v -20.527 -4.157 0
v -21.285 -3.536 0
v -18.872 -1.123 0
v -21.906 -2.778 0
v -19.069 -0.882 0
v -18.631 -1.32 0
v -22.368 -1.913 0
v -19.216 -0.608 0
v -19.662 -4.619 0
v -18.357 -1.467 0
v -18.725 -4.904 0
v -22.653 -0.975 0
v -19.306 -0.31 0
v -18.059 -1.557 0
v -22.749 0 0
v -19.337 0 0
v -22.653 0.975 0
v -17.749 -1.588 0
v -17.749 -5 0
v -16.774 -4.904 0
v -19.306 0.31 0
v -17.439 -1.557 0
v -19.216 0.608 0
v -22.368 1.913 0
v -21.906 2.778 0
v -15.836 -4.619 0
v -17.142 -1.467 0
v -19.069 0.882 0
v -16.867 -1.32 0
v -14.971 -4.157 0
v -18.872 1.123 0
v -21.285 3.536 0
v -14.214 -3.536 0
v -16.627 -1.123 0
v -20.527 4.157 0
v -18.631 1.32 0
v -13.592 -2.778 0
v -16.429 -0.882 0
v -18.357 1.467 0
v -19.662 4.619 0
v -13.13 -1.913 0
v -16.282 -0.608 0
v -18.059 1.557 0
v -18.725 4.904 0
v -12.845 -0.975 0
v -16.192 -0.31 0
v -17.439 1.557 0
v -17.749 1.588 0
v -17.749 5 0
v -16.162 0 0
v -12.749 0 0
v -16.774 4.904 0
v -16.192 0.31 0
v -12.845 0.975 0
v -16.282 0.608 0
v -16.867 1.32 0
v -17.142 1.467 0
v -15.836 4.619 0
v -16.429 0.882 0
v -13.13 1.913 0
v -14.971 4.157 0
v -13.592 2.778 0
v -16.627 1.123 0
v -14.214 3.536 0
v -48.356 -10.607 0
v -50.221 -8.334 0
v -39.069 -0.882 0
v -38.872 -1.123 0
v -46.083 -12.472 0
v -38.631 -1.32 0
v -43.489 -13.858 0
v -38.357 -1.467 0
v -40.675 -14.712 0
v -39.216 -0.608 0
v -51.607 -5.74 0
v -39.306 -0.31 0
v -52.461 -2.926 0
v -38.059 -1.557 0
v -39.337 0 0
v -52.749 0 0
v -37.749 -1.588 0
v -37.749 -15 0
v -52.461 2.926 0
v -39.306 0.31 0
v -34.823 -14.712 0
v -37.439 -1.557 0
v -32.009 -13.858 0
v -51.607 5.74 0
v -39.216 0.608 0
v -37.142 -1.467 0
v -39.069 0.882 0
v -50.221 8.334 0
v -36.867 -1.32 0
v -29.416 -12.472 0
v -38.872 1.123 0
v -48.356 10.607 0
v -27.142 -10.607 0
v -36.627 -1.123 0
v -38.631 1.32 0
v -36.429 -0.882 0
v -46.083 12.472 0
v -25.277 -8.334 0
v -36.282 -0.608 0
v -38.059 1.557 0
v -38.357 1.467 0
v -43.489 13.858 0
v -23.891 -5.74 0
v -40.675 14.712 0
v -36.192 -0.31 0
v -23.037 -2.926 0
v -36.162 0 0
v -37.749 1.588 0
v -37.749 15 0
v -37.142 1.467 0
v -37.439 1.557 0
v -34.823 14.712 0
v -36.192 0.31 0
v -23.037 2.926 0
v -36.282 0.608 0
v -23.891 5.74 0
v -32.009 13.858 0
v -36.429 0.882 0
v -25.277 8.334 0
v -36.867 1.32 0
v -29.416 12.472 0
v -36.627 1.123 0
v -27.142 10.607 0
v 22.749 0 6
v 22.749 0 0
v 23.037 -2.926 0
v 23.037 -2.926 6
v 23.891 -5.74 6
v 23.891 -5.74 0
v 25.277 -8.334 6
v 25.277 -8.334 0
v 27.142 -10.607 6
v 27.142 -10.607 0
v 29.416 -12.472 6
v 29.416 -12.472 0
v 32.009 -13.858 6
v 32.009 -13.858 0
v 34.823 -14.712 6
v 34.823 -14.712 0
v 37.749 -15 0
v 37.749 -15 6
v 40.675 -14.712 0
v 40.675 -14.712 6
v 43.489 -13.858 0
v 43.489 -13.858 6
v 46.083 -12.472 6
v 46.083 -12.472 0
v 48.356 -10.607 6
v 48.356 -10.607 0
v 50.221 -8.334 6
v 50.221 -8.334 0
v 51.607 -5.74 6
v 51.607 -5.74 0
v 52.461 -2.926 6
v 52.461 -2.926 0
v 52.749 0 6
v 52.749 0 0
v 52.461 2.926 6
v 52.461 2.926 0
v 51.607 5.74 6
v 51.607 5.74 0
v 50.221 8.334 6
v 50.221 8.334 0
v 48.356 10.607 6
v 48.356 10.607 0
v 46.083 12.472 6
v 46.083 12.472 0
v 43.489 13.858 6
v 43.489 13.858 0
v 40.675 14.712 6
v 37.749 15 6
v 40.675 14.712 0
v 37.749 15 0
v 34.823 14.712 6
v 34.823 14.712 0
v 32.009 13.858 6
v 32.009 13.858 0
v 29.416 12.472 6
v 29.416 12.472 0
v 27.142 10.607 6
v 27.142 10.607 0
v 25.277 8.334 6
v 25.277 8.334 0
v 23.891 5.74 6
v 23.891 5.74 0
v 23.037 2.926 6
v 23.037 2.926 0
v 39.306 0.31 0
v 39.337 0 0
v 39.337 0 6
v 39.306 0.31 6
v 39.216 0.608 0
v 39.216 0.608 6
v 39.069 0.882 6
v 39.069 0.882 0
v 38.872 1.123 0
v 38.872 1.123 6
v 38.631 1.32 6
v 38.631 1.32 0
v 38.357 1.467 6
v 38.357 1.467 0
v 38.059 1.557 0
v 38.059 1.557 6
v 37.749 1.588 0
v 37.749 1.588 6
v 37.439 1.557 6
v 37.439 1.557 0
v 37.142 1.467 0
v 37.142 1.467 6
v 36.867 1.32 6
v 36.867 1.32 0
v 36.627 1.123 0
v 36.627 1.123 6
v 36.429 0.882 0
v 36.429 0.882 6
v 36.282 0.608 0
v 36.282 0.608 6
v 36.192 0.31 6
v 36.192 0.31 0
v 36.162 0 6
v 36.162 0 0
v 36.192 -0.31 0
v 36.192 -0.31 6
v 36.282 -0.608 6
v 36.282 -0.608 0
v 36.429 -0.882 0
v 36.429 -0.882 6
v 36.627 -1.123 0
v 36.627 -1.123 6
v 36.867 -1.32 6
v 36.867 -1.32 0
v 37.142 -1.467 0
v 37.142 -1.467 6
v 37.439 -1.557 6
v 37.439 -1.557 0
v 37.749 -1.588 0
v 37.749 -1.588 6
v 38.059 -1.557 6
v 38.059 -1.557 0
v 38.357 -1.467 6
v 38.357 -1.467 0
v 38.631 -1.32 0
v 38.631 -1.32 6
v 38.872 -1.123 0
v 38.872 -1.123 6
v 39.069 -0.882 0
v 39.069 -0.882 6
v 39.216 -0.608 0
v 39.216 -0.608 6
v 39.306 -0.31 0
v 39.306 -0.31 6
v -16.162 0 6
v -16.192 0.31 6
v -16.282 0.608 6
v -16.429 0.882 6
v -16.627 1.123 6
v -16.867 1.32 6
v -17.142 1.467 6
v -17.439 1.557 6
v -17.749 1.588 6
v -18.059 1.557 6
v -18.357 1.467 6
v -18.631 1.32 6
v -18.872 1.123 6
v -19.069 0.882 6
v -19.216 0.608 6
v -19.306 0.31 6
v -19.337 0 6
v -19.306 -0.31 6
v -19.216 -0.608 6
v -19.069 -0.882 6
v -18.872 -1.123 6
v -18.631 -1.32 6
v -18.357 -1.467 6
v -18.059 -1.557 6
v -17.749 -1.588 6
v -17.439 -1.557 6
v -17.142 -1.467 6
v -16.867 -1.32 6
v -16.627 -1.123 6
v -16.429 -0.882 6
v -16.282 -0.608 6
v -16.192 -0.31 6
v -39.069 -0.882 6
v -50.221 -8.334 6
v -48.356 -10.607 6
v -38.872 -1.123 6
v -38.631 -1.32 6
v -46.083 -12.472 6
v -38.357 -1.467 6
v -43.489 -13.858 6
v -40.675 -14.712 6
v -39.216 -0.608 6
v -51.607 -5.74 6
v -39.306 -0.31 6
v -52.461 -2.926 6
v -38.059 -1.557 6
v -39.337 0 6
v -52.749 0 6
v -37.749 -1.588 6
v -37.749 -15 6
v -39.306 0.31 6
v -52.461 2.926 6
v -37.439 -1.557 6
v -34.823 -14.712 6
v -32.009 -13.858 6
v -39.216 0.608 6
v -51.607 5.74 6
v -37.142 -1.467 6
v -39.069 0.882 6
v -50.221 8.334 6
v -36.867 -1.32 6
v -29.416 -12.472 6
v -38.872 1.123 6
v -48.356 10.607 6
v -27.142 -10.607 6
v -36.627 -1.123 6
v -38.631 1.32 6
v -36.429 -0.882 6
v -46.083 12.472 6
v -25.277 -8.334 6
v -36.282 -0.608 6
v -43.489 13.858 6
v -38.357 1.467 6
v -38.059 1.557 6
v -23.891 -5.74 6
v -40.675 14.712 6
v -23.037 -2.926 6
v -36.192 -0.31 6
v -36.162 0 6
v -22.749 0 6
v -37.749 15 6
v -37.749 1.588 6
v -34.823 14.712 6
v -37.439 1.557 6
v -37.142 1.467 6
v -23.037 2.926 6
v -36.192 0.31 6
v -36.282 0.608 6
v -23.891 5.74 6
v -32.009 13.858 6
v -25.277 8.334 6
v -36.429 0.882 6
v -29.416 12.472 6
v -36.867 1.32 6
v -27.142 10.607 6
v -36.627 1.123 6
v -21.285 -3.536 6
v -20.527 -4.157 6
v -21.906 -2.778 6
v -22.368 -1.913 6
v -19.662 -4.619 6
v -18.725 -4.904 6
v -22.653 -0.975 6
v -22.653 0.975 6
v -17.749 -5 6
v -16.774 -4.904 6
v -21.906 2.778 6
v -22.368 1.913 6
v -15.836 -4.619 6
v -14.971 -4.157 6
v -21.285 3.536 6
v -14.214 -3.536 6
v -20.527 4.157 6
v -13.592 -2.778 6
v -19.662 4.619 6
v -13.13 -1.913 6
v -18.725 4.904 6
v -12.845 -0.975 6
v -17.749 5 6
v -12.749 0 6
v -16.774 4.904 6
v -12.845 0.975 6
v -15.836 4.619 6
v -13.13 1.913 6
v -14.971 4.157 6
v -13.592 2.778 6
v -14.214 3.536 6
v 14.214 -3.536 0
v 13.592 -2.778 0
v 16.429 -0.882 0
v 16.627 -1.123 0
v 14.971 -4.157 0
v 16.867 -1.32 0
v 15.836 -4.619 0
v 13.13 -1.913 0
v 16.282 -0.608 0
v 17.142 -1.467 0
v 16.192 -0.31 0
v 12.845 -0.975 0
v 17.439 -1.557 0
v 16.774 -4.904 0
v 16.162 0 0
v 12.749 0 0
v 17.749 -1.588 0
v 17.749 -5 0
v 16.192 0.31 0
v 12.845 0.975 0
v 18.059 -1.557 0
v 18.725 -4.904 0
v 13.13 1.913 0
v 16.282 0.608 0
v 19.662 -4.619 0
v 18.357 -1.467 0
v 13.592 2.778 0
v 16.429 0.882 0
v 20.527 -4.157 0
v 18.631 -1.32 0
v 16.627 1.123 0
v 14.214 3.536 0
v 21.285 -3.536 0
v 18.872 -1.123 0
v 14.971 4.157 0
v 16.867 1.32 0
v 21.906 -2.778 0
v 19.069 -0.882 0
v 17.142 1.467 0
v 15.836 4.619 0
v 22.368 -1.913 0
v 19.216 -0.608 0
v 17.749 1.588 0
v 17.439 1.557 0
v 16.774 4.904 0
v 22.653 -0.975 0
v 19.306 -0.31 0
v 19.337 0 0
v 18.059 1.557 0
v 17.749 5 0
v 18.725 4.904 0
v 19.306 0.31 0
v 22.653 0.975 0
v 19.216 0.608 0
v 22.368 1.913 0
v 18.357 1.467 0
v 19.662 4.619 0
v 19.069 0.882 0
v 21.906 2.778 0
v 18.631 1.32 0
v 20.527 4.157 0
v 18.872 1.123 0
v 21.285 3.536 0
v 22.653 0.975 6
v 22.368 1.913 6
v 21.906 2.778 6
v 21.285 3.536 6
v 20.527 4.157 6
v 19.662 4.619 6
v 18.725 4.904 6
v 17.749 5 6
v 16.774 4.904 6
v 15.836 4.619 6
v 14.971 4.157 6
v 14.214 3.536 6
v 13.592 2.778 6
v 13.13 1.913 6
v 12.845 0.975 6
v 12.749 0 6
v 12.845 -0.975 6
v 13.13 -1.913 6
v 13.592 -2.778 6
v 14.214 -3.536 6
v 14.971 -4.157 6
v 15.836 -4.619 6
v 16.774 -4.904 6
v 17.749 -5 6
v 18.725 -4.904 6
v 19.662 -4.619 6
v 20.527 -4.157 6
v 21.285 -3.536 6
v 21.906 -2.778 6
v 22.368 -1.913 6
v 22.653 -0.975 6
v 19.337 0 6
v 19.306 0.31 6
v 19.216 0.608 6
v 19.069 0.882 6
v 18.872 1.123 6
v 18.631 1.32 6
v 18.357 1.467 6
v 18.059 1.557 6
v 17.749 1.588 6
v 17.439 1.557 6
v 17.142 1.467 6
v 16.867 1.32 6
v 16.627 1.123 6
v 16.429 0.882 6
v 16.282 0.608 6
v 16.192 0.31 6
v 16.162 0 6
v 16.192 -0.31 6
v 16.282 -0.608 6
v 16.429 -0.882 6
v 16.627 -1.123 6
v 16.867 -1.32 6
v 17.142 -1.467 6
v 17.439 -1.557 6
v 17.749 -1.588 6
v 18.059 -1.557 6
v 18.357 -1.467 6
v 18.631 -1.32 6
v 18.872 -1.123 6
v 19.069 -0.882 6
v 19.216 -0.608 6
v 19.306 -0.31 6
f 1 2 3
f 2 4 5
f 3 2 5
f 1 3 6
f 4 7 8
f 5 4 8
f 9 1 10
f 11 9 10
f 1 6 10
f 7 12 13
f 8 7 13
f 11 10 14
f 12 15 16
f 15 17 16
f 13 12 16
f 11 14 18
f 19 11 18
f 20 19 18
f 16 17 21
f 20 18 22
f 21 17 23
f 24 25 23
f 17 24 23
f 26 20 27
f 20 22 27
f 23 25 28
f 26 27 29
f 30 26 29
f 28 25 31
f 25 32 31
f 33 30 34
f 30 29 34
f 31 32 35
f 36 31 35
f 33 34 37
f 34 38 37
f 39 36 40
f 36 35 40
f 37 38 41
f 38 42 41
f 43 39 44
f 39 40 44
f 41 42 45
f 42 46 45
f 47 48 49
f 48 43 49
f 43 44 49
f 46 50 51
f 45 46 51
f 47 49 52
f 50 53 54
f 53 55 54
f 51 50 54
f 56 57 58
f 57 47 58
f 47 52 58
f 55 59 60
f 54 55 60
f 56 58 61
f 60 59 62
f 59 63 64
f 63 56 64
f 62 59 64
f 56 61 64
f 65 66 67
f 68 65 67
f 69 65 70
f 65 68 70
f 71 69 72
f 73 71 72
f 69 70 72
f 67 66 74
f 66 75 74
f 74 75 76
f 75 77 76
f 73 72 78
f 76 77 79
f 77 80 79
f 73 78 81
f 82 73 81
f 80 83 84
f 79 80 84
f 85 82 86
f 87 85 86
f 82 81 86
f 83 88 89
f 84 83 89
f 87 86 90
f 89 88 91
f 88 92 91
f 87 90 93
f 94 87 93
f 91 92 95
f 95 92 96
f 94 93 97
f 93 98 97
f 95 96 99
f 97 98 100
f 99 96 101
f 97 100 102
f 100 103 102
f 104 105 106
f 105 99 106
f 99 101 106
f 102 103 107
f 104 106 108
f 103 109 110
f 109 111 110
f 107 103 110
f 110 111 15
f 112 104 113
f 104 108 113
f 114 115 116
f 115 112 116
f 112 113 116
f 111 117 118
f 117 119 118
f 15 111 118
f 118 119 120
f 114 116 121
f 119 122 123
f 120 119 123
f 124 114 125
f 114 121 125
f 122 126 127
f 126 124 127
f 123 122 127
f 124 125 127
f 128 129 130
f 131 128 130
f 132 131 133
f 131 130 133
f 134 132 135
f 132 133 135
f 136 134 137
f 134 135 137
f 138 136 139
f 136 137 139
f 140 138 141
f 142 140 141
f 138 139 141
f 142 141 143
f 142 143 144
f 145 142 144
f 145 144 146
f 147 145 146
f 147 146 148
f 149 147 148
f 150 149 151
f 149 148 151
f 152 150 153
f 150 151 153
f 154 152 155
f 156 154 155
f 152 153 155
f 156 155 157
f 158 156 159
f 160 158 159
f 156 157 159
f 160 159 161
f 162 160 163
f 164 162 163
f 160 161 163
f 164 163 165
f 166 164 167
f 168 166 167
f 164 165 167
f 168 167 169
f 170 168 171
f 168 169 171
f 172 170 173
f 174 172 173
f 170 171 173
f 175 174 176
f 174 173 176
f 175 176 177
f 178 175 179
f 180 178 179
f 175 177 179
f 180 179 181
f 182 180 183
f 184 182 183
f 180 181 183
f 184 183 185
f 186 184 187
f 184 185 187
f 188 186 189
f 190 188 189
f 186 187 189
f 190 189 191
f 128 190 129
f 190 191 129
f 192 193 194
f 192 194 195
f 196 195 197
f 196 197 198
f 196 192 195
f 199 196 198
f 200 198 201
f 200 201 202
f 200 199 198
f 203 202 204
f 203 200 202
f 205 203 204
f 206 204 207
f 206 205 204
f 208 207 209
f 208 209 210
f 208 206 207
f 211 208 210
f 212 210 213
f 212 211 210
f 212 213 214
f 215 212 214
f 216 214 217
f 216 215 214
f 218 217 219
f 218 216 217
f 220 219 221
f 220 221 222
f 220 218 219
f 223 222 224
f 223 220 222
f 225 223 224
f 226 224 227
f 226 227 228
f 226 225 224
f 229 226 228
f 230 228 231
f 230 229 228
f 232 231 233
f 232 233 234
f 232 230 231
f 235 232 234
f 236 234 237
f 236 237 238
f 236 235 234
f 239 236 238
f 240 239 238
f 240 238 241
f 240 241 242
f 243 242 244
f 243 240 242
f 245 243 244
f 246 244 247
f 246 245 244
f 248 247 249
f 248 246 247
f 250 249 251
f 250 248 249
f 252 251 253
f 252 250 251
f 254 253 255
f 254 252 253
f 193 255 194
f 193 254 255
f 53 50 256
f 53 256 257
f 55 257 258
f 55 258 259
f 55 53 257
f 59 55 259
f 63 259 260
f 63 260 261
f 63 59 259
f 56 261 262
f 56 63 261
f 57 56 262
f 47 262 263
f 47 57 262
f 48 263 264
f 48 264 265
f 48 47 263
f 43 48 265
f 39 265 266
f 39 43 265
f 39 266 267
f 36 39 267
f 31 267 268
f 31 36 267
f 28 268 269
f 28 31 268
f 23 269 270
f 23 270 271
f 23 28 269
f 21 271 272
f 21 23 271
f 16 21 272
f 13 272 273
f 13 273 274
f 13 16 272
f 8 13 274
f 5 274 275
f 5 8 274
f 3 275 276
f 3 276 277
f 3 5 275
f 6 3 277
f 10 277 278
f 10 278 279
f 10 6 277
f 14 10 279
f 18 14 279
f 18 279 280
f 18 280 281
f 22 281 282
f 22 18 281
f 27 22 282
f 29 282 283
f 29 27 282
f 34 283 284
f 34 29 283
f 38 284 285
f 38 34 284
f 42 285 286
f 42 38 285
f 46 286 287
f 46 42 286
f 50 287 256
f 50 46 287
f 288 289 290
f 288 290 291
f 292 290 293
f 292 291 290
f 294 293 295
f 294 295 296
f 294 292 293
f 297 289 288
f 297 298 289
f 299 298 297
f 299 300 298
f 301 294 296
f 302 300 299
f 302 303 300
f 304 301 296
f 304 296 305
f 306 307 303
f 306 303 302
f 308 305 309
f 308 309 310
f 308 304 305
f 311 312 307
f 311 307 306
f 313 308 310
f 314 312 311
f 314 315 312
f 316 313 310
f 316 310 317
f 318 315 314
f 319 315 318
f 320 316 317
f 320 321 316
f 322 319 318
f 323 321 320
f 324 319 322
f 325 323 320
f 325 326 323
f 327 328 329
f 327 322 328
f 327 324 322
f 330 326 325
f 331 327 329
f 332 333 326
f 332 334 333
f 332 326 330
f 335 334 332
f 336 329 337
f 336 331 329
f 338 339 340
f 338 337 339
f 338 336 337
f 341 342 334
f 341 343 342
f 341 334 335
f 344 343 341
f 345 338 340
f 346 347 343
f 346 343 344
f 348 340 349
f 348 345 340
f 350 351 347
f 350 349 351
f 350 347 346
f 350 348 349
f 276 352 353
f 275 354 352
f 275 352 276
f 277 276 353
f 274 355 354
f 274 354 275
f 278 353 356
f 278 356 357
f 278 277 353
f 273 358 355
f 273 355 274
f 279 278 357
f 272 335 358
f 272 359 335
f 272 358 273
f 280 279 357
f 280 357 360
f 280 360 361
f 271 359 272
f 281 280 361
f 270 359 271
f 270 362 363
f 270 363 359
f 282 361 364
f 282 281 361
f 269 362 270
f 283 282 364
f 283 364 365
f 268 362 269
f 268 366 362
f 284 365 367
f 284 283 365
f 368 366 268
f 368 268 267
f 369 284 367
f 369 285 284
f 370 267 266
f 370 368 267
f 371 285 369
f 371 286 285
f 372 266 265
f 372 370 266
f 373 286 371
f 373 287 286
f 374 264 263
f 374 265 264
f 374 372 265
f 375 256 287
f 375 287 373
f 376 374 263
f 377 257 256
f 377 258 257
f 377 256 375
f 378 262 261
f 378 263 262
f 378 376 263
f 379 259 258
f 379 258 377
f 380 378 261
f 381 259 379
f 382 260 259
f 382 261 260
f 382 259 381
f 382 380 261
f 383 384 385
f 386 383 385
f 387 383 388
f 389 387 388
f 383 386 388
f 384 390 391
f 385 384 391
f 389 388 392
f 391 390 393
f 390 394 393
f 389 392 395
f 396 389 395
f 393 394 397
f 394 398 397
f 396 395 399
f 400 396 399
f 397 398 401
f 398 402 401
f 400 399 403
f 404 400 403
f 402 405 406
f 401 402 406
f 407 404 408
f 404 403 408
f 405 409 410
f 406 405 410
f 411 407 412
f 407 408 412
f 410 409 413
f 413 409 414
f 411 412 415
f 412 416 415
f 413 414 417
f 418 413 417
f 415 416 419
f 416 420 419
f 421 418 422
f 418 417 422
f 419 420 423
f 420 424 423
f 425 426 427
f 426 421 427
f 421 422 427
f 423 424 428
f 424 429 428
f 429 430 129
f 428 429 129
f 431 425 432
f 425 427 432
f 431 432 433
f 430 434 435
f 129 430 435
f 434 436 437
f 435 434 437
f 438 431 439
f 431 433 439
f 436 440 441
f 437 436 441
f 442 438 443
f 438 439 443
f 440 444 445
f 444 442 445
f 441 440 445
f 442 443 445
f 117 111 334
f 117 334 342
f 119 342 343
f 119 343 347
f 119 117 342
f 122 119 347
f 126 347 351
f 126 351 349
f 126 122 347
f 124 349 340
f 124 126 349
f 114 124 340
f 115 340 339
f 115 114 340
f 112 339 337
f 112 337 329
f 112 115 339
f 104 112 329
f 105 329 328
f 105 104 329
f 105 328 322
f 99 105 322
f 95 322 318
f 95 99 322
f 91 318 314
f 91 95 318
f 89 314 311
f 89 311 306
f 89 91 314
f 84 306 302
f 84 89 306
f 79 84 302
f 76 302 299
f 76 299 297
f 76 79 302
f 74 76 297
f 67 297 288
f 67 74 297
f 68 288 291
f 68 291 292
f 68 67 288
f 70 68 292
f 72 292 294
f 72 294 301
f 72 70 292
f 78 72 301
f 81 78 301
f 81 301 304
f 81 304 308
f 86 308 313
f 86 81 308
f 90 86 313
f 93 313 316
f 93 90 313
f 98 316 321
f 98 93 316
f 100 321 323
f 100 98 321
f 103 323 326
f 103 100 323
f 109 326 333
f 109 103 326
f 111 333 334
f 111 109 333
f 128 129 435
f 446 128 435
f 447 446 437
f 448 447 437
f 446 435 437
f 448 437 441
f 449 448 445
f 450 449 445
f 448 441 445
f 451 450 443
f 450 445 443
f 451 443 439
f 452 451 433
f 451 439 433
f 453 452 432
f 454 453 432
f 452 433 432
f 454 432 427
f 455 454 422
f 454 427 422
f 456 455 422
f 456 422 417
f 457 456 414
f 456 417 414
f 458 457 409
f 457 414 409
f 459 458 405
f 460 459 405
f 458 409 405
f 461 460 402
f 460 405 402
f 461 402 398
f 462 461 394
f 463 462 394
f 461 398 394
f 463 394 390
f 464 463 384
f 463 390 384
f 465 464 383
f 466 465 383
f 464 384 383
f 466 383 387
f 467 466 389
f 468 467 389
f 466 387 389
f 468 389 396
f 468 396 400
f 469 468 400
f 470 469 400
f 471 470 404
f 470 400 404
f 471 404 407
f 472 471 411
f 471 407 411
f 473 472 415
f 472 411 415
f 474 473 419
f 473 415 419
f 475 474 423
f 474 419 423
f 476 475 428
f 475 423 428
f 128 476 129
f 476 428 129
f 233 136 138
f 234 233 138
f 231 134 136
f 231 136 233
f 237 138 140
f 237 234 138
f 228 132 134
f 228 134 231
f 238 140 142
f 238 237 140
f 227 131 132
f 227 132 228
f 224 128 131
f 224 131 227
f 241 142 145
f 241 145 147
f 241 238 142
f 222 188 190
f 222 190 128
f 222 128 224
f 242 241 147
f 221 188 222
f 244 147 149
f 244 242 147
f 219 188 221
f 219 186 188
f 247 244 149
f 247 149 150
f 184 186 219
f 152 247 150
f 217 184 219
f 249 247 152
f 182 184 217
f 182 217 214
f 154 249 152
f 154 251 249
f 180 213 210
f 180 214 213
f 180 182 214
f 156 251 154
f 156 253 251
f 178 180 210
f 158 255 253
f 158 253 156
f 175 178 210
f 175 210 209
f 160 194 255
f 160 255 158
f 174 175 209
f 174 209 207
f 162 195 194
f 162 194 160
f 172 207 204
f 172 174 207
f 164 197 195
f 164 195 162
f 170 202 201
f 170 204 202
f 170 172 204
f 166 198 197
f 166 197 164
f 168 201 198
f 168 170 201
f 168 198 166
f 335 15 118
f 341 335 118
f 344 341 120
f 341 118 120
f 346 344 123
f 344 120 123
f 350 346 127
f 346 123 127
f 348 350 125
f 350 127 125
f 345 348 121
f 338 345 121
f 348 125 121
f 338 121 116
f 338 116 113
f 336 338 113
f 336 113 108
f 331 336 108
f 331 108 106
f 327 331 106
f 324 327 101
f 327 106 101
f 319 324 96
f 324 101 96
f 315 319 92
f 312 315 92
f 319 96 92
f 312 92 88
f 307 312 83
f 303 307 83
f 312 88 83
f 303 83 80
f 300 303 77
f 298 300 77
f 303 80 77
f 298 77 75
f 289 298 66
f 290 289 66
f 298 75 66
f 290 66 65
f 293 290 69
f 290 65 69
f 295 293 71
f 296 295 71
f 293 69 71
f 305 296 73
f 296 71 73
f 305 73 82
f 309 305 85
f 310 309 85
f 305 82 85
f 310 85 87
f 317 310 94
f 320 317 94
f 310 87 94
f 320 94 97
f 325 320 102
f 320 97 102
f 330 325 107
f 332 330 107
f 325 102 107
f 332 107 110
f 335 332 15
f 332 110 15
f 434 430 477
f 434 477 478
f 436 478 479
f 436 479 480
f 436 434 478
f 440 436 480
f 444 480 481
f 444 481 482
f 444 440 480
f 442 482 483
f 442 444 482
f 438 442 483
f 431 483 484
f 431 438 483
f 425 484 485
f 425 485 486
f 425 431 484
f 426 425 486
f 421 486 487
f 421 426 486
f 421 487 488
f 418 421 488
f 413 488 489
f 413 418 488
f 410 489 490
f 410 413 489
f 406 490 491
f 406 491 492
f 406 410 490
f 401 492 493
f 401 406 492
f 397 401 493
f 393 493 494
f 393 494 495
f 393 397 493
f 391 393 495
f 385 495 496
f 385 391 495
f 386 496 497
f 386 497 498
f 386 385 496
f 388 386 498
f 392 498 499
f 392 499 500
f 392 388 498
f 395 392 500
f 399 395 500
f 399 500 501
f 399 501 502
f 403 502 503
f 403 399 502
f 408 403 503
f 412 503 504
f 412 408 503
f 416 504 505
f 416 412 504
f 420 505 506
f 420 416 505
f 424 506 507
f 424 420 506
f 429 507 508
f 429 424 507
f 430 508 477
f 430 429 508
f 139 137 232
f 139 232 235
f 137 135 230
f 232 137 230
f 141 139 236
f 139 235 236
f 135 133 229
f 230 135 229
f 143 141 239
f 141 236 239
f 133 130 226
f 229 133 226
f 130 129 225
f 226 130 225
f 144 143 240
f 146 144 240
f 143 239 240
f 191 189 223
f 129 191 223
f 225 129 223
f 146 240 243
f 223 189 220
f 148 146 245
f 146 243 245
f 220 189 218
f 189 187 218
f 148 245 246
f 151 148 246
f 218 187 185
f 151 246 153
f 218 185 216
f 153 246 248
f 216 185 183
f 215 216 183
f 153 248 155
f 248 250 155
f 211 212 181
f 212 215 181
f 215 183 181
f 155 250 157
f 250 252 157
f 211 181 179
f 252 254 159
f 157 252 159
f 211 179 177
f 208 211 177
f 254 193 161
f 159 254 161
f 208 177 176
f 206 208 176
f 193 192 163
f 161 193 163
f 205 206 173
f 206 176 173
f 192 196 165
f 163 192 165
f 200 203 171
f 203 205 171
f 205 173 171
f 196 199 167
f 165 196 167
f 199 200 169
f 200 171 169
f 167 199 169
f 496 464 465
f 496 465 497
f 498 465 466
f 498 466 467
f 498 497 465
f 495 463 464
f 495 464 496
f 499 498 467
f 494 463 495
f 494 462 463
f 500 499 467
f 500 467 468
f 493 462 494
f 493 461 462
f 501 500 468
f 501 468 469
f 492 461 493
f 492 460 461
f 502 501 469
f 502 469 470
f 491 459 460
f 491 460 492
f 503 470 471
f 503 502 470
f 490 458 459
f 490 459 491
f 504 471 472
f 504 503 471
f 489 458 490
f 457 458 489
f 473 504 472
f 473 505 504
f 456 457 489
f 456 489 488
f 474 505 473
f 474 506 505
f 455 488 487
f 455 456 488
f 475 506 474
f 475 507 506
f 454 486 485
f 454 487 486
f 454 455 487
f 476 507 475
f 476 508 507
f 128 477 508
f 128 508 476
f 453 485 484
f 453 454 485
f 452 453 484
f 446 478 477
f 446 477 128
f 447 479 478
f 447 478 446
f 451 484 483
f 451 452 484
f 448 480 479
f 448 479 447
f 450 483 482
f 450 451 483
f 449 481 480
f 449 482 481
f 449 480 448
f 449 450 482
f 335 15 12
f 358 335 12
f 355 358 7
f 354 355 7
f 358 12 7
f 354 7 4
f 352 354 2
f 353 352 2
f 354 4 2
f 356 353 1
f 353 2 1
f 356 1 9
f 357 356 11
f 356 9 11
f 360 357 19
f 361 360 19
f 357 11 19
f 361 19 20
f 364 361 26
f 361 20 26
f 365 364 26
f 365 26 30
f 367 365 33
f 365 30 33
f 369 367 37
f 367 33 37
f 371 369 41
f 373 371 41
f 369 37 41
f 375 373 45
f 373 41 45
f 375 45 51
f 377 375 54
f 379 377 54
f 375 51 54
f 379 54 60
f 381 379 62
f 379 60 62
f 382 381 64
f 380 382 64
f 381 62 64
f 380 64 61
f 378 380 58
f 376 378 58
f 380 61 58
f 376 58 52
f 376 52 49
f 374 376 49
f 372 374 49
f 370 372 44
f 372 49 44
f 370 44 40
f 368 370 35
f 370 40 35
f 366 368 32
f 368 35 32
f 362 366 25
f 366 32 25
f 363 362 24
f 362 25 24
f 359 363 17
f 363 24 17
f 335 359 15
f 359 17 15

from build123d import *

# Parameters (mm, degrees)
F0_R     = 1.5875
F0_R_2   = 15
F0_R_3   = 5
F1_DEPTH = 6


with BuildPart() as f1:
    # F0 (on Top) → F1 (new body)
    with BuildSketch(Plane.XY):
        with BuildLine():
            ThreePointArc((-22.749078, 0), (-17.749078, -5), (-12.749078, 0))
            ThreePointArc((-12.749078, 0), (-17.749078, 5), (-22.749078, 0))
        make_face()
        with Locations((-17.749078, 0)):
            Circle(F0_R, mode=Mode.SUBTRACT)
        with Locations((-37.749078, 0)):
            Circle(F0_R_2)
        with Locations((-37.749078, 0)):
            Circle(F0_R, mode=Mode.SUBTRACT)
        with BuildLine():
            ThreePointArc((22.749078, 0), (37.749078, -15), (52.749078, 0))
            ThreePointArc((52.749078, 0), (37.749078, 15), (22.749078, 0))
        make_face()
        with Locations((37.749078, 0)):
            Circle(F0_R, mode=Mode.SUBTRACT)
        with Locations((17.749078, 0)):
            Circle(F0_R_3)
        with Locations((17.749078, 0)):
            Circle(F0_R, mode=Mode.SUBTRACT)
    extrude(amount=F1_DEPTH)


solid = f1.part
